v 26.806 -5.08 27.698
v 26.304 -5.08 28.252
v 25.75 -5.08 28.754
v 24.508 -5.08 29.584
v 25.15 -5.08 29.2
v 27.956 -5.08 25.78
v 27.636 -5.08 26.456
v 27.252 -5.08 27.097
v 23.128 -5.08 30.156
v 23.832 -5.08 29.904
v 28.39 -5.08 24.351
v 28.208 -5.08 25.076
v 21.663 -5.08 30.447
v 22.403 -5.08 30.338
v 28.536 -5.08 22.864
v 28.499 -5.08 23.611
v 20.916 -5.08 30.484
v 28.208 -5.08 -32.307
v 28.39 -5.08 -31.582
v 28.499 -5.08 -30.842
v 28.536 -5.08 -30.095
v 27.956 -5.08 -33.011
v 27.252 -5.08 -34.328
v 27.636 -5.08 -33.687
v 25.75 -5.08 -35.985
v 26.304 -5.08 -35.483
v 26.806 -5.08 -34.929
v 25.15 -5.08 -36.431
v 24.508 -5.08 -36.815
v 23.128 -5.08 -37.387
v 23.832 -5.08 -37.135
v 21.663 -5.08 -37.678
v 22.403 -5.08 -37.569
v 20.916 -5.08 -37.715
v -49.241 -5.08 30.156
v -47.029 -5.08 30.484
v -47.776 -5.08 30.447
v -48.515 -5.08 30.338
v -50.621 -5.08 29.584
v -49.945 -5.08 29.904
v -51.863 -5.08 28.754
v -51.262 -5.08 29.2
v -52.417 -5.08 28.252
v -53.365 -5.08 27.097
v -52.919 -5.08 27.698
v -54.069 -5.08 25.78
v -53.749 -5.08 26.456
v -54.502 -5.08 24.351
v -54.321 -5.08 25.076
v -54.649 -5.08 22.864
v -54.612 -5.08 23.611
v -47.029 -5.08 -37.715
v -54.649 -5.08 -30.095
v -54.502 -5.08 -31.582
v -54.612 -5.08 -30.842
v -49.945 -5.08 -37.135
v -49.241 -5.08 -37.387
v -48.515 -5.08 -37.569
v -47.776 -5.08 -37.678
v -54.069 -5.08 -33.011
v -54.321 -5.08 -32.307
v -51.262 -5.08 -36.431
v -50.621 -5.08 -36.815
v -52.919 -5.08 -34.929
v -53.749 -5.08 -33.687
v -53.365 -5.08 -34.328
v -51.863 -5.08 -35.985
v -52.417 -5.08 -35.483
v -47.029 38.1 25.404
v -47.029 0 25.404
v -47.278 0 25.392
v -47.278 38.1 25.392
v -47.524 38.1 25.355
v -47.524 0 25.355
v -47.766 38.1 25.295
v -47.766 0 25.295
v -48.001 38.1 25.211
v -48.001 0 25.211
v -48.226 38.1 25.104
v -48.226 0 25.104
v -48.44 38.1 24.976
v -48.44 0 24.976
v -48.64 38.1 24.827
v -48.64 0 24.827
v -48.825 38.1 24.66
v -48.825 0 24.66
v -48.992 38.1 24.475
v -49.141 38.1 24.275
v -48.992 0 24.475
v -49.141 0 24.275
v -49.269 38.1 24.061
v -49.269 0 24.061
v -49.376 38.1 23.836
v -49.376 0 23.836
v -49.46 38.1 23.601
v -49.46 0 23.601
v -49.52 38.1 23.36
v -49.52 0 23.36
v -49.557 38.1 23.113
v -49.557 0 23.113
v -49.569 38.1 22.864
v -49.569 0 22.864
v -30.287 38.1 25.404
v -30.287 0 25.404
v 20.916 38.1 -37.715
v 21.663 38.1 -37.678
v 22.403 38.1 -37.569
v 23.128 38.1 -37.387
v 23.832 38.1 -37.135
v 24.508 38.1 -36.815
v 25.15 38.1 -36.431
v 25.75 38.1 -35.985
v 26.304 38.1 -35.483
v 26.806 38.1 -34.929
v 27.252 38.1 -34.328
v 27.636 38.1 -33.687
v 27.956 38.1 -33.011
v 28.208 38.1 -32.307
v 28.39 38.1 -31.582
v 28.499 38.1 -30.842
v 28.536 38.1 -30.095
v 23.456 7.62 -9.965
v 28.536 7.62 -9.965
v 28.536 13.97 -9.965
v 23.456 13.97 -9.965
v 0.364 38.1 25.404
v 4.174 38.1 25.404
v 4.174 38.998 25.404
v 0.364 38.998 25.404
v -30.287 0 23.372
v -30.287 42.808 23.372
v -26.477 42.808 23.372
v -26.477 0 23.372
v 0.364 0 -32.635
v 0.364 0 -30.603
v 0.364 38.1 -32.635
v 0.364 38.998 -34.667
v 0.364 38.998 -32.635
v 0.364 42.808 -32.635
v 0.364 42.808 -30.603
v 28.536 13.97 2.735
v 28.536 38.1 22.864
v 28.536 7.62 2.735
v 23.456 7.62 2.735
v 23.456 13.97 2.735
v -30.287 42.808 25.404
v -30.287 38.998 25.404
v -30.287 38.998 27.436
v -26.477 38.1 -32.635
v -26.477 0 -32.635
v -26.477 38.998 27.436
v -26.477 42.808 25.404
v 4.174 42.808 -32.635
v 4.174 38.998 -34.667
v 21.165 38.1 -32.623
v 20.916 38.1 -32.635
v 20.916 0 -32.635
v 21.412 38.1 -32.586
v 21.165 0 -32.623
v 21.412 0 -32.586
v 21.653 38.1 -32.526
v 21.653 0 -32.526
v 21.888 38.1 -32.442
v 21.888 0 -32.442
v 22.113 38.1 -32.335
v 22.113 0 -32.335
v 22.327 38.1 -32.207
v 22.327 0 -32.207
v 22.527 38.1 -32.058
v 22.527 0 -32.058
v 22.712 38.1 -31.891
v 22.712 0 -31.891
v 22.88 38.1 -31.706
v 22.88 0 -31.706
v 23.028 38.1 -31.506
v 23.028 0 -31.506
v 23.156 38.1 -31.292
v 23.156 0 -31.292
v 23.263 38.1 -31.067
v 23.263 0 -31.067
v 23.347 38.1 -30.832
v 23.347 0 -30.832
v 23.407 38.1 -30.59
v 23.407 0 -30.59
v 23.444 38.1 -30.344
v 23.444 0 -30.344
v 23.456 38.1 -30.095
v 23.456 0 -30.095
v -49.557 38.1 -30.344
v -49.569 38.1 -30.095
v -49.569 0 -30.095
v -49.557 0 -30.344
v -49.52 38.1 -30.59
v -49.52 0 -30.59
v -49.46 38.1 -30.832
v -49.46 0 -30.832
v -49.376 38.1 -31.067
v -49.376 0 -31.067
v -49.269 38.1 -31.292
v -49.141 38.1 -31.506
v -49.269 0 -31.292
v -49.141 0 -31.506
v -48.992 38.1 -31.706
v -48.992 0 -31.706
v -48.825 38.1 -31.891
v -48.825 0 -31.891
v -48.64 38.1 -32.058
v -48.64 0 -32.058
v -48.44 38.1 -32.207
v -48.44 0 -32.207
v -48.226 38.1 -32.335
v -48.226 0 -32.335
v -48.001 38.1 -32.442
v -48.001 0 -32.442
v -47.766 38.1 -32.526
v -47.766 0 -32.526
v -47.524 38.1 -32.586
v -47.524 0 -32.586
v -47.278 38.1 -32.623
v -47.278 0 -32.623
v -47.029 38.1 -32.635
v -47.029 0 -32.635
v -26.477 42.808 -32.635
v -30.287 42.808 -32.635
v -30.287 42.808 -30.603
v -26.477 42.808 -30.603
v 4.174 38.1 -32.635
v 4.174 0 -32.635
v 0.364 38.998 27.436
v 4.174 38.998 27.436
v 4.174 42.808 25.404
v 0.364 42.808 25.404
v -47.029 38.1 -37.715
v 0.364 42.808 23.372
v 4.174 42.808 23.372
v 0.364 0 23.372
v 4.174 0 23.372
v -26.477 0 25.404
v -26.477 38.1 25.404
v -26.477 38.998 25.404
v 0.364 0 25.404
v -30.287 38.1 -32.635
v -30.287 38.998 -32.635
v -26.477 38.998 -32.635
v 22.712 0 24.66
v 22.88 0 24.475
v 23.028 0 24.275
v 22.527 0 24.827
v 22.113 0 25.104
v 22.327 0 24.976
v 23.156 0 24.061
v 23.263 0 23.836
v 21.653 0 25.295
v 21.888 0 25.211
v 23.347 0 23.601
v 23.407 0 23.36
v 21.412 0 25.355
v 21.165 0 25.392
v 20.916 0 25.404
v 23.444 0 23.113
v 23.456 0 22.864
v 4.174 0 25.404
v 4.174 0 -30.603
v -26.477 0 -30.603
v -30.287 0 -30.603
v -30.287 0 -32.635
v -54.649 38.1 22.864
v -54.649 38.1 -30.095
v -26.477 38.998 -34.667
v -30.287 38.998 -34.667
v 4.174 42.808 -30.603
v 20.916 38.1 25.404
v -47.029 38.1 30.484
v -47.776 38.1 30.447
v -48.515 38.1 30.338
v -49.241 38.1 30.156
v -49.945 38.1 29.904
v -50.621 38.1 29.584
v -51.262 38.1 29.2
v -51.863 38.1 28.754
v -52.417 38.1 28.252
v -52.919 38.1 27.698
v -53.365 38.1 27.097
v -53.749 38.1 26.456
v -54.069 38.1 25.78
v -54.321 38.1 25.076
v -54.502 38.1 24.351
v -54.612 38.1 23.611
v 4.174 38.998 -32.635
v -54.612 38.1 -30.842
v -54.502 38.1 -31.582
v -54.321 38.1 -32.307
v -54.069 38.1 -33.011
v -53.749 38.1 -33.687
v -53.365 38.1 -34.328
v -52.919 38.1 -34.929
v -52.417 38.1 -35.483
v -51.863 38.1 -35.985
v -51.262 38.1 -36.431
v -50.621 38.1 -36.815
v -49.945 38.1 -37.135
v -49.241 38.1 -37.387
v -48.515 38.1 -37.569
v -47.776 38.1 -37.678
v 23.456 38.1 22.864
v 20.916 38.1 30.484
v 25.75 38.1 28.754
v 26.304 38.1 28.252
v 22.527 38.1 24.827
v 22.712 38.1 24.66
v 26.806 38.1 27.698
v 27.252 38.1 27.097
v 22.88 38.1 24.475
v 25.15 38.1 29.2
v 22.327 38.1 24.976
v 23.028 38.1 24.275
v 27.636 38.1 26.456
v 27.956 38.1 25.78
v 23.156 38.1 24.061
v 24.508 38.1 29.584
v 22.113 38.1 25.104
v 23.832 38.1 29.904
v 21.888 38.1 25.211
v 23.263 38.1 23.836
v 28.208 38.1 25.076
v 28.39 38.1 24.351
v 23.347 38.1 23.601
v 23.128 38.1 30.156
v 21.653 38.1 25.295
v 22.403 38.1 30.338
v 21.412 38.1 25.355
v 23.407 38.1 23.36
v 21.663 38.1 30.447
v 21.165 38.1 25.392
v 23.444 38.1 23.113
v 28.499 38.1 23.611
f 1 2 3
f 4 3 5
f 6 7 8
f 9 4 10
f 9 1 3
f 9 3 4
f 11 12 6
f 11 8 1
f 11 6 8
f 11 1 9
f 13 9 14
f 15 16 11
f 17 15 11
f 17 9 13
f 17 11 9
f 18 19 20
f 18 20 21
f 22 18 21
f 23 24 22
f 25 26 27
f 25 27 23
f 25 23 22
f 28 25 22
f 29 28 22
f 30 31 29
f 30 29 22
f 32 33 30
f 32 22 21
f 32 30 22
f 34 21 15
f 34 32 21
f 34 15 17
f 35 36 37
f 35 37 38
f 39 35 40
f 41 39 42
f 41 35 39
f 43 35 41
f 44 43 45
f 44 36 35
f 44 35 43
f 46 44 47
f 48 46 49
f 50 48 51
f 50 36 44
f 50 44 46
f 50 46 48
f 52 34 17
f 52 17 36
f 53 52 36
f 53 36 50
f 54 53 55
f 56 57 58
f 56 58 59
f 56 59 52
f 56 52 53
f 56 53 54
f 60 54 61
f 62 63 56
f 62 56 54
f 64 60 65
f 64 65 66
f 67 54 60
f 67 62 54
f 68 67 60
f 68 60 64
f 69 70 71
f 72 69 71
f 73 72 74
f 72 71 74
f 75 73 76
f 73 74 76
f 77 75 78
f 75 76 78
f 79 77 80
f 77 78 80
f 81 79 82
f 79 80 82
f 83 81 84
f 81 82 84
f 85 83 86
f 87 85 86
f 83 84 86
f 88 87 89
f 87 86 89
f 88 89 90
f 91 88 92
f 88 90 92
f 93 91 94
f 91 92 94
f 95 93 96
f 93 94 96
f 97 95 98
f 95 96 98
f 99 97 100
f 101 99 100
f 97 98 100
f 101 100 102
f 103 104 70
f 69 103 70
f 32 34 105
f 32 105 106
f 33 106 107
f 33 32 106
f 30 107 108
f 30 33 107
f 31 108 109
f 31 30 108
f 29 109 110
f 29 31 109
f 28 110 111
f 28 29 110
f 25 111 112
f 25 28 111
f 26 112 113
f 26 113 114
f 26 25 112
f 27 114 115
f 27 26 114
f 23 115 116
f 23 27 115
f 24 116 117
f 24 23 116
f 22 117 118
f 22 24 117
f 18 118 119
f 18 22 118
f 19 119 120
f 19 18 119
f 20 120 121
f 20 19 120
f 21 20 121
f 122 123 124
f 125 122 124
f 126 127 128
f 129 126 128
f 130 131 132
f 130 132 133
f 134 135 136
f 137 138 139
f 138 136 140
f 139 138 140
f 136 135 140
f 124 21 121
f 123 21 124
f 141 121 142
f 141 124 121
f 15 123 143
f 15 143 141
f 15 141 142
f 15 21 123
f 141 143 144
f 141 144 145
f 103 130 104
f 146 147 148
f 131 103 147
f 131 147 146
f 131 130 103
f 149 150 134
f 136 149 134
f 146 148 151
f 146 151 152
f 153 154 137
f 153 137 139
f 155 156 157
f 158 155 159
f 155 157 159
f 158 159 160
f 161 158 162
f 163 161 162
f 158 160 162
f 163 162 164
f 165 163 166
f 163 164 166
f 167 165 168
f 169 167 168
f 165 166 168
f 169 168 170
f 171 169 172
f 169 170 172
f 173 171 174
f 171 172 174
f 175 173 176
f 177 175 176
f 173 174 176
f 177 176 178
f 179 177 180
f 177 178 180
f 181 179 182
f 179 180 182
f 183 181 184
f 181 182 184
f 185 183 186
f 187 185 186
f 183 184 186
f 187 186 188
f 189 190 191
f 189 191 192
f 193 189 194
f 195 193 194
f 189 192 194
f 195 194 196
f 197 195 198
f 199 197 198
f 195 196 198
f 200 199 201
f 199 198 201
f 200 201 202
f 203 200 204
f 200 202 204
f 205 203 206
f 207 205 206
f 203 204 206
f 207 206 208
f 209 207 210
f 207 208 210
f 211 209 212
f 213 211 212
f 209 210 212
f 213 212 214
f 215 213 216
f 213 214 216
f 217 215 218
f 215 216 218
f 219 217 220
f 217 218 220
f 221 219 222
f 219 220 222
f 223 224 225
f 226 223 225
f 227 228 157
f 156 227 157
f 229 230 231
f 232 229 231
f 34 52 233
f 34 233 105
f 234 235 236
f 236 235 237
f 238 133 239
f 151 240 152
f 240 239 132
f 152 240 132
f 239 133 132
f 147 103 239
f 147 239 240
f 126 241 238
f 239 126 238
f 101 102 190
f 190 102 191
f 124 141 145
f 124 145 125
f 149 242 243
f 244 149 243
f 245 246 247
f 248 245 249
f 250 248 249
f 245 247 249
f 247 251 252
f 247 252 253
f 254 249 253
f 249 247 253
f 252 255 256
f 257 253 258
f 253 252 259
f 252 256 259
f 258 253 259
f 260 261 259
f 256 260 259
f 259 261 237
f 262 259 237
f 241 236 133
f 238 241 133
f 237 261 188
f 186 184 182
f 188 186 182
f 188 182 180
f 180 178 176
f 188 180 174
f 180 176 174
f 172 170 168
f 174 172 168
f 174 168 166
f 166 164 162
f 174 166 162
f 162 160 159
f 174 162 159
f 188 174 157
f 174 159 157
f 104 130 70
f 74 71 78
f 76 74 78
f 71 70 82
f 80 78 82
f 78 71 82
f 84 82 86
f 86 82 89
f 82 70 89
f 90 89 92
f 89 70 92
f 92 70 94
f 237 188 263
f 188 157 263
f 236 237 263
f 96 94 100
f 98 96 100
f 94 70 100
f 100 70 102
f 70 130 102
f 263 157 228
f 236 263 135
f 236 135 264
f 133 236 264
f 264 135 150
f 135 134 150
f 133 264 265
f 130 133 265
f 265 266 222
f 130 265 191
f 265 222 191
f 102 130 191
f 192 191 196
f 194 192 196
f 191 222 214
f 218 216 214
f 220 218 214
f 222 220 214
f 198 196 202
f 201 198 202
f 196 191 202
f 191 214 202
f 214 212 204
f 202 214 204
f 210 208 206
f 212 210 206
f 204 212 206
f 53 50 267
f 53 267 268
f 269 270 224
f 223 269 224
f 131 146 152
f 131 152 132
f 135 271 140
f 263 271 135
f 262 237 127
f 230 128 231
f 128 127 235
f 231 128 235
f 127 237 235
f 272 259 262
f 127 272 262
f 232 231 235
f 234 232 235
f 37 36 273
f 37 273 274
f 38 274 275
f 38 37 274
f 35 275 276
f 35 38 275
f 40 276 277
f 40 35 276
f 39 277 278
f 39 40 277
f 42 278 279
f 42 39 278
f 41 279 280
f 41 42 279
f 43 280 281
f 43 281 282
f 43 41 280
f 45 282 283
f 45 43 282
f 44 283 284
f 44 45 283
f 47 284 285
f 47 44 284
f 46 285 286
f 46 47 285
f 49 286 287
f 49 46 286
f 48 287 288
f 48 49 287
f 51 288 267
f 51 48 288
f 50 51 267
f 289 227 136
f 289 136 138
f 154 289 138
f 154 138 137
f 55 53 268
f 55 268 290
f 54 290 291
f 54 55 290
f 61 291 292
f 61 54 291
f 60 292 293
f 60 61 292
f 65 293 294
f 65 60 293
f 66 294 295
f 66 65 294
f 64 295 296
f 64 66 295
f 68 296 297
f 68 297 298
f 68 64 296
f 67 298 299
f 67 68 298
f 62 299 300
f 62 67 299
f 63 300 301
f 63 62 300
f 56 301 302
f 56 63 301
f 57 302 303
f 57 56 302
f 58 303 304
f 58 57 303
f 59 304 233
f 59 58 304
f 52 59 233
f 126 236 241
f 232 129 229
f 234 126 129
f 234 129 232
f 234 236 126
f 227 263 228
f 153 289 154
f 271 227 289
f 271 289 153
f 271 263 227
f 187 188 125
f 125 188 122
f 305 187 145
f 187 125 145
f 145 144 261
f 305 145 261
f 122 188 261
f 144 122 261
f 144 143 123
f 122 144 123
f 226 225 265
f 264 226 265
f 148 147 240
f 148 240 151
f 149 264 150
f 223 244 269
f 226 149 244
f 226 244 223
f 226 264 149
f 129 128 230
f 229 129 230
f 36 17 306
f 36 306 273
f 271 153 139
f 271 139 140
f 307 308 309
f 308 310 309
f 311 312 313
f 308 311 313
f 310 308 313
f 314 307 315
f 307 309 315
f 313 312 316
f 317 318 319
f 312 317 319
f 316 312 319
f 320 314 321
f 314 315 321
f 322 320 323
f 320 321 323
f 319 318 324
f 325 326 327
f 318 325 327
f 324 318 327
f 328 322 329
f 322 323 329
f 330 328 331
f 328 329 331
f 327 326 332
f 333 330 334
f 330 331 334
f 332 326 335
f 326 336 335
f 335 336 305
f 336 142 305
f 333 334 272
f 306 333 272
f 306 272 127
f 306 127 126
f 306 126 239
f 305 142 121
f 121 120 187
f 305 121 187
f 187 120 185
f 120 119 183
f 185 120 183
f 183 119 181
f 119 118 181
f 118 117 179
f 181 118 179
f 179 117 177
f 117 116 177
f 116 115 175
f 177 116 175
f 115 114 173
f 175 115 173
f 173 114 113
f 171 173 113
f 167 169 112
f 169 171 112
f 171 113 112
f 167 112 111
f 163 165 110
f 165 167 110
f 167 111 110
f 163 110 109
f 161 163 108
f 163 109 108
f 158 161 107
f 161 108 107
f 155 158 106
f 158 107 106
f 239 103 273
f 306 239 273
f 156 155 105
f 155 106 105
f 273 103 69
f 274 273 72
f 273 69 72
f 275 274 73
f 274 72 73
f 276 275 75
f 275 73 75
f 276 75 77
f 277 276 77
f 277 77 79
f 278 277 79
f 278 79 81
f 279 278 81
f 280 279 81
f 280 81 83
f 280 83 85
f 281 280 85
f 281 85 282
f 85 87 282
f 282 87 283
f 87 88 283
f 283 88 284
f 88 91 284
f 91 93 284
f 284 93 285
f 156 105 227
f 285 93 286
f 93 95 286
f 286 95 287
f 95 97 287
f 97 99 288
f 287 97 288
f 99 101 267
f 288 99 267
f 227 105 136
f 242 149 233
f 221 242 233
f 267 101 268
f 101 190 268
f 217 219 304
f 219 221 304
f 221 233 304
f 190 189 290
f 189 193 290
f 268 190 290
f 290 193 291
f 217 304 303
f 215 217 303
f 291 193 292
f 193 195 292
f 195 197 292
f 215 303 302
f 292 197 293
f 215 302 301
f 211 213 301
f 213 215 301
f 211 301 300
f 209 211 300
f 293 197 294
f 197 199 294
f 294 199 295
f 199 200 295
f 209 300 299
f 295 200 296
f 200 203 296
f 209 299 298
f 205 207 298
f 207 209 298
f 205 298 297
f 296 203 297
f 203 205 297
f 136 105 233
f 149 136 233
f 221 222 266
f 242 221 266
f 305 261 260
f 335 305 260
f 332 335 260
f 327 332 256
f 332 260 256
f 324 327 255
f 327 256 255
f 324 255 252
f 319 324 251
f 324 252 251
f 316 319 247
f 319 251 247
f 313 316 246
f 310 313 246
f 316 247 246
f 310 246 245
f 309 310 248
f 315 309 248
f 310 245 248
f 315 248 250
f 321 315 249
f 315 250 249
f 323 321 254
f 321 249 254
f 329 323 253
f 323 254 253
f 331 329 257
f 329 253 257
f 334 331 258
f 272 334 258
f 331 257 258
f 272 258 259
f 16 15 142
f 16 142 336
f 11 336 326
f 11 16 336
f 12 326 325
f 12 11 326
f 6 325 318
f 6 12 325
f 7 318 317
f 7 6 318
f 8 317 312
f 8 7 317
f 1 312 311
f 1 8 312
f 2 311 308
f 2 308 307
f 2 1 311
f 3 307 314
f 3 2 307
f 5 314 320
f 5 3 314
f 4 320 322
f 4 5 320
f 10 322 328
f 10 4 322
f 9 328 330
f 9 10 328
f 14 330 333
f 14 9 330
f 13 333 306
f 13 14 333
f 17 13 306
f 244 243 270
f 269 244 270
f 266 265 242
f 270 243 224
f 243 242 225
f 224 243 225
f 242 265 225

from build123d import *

# Parameters (mm, degrees)
BOSS_EXTRUDE1_DEPTH  = 38.1
SHELL1_T             = 5.08
SNAP_START           = -30.286635041
SNAP_HOOK1_DEPTH     = 3.81
MIRROR2_START        = -30.286635041
MIRROR2_COPY_1_DEPTH = 3.81
SKETCH2_W            = 12.7
SKETCH2_H            = 6.35
CUT_EXTRUDE1_DEPTH   = 19.304


# Read off the part's stored shape, not the designer's step: Snap Hook1
with BuildPart() as part:
    # Sketch1 → Boss-Extrude1 (new body)
    with BuildSketch(Plane(origin=(0, 0, 0), x_dir=(1, 0, 0), z_dir=(0, 1, 0))):
        with BuildLine():
            Line((-47.028877551, 32.634950255), (20.916122449, 32.634950255))
            ThreePointArc((20.916122449, 32.634950255), (22.712173673, 31.891001479), (23.456122449, 30.094950255))
            Line((23.456122449, 30.094950255), (23.456122449, -22.864049745))
            ThreePointArc((23.456122449, -22.864049745), (22.712173673, -24.660100969), (20.916122449, -25.404049745))
            Line((20.916122449, -25.404049745), (-47.028877551, -25.404049745))
            ThreePointArc((-47.028877551, -25.404049745), (-48.824928775, -24.660100969), (-49.568877551, -22.864049745))
            Line((-49.568877551, -22.864049745), (-49.568877551, 30.094950255))
            ThreePointArc((-49.568877551, 30.094950255), (-48.824928775, 31.891001479), (-47.028877551, 32.634950255))
        make_face()
    extrude(amount=BOSS_EXTRUDE1_DEPTH)

    # Shell1
    shell1_openings = [part.faces().sort_by_distance(p)[0] for p in [
        (-13.056377551, 38.1, -3.615450255),
    ]]
    offset(amount=SHELL1_T, openings=shell1_openings, kind=Kind.INTERSECTION)

    # Snap Hook1 outline → Snap Hook1 (add)
    with BuildSketch(Plane.YZ.offset(SNAP_START)):
        Polygon((38.998243942, -34.666950255), (42.808243942, -32.634950255), (42.808243942, -30.602950255), (0, -30.602950255), (0, -32.634950255), (38.998243942, -32.634950255), align=None)
    snap_hook1 = extrude(amount=SNAP_HOOK1_DEPTH)

    # Mirror1: Snap Hook1 across plane
    add(snap_hook1.mirror(Plane.XY.offset(-3.615450255)))

    # Mirror2: Snap Hook1 across plane
    add(snap_hook1.mirror(Plane(origin=(-13.056377551, 0, 0), x_dir=(0, 0, 1), z_dir=(1, 0, 0))))

    # Mirror2 copy 1 sketch → Mirror2 copy 1 (add)
    with BuildSketch(Plane(origin=(-26.112755102, 0, -7.23090051), x_dir=(0, 1, 0), z_dir=(-1, 0, 0)).offset(MIRROR2_START)):
        Polygon((38.998243942, -34.666950255), (42.808243942, -32.634950255), (42.808243942, -30.602950255), (0, -30.602950255), (0, -32.634950255), (38.998243942, -32.634950255), align=None)
    extrude(amount=MIRROR2_COPY_1_DEPTH)

    # Sketch2 → Cut-Extrude1 (cut)
    with BuildSketch(Plane(origin=(28.536122449, 0, 0), x_dir=(0, 0, -1), z_dir=(1, 0, 0))):
        with Locations((3.615450255, 10.795)):
            Rectangle(SKETCH2_W, SKETCH2_H)
    extrude(amount=-CUT_EXTRUDE1_DEPTH, mode=Mode.SUBTRACT)


solid = part.part
